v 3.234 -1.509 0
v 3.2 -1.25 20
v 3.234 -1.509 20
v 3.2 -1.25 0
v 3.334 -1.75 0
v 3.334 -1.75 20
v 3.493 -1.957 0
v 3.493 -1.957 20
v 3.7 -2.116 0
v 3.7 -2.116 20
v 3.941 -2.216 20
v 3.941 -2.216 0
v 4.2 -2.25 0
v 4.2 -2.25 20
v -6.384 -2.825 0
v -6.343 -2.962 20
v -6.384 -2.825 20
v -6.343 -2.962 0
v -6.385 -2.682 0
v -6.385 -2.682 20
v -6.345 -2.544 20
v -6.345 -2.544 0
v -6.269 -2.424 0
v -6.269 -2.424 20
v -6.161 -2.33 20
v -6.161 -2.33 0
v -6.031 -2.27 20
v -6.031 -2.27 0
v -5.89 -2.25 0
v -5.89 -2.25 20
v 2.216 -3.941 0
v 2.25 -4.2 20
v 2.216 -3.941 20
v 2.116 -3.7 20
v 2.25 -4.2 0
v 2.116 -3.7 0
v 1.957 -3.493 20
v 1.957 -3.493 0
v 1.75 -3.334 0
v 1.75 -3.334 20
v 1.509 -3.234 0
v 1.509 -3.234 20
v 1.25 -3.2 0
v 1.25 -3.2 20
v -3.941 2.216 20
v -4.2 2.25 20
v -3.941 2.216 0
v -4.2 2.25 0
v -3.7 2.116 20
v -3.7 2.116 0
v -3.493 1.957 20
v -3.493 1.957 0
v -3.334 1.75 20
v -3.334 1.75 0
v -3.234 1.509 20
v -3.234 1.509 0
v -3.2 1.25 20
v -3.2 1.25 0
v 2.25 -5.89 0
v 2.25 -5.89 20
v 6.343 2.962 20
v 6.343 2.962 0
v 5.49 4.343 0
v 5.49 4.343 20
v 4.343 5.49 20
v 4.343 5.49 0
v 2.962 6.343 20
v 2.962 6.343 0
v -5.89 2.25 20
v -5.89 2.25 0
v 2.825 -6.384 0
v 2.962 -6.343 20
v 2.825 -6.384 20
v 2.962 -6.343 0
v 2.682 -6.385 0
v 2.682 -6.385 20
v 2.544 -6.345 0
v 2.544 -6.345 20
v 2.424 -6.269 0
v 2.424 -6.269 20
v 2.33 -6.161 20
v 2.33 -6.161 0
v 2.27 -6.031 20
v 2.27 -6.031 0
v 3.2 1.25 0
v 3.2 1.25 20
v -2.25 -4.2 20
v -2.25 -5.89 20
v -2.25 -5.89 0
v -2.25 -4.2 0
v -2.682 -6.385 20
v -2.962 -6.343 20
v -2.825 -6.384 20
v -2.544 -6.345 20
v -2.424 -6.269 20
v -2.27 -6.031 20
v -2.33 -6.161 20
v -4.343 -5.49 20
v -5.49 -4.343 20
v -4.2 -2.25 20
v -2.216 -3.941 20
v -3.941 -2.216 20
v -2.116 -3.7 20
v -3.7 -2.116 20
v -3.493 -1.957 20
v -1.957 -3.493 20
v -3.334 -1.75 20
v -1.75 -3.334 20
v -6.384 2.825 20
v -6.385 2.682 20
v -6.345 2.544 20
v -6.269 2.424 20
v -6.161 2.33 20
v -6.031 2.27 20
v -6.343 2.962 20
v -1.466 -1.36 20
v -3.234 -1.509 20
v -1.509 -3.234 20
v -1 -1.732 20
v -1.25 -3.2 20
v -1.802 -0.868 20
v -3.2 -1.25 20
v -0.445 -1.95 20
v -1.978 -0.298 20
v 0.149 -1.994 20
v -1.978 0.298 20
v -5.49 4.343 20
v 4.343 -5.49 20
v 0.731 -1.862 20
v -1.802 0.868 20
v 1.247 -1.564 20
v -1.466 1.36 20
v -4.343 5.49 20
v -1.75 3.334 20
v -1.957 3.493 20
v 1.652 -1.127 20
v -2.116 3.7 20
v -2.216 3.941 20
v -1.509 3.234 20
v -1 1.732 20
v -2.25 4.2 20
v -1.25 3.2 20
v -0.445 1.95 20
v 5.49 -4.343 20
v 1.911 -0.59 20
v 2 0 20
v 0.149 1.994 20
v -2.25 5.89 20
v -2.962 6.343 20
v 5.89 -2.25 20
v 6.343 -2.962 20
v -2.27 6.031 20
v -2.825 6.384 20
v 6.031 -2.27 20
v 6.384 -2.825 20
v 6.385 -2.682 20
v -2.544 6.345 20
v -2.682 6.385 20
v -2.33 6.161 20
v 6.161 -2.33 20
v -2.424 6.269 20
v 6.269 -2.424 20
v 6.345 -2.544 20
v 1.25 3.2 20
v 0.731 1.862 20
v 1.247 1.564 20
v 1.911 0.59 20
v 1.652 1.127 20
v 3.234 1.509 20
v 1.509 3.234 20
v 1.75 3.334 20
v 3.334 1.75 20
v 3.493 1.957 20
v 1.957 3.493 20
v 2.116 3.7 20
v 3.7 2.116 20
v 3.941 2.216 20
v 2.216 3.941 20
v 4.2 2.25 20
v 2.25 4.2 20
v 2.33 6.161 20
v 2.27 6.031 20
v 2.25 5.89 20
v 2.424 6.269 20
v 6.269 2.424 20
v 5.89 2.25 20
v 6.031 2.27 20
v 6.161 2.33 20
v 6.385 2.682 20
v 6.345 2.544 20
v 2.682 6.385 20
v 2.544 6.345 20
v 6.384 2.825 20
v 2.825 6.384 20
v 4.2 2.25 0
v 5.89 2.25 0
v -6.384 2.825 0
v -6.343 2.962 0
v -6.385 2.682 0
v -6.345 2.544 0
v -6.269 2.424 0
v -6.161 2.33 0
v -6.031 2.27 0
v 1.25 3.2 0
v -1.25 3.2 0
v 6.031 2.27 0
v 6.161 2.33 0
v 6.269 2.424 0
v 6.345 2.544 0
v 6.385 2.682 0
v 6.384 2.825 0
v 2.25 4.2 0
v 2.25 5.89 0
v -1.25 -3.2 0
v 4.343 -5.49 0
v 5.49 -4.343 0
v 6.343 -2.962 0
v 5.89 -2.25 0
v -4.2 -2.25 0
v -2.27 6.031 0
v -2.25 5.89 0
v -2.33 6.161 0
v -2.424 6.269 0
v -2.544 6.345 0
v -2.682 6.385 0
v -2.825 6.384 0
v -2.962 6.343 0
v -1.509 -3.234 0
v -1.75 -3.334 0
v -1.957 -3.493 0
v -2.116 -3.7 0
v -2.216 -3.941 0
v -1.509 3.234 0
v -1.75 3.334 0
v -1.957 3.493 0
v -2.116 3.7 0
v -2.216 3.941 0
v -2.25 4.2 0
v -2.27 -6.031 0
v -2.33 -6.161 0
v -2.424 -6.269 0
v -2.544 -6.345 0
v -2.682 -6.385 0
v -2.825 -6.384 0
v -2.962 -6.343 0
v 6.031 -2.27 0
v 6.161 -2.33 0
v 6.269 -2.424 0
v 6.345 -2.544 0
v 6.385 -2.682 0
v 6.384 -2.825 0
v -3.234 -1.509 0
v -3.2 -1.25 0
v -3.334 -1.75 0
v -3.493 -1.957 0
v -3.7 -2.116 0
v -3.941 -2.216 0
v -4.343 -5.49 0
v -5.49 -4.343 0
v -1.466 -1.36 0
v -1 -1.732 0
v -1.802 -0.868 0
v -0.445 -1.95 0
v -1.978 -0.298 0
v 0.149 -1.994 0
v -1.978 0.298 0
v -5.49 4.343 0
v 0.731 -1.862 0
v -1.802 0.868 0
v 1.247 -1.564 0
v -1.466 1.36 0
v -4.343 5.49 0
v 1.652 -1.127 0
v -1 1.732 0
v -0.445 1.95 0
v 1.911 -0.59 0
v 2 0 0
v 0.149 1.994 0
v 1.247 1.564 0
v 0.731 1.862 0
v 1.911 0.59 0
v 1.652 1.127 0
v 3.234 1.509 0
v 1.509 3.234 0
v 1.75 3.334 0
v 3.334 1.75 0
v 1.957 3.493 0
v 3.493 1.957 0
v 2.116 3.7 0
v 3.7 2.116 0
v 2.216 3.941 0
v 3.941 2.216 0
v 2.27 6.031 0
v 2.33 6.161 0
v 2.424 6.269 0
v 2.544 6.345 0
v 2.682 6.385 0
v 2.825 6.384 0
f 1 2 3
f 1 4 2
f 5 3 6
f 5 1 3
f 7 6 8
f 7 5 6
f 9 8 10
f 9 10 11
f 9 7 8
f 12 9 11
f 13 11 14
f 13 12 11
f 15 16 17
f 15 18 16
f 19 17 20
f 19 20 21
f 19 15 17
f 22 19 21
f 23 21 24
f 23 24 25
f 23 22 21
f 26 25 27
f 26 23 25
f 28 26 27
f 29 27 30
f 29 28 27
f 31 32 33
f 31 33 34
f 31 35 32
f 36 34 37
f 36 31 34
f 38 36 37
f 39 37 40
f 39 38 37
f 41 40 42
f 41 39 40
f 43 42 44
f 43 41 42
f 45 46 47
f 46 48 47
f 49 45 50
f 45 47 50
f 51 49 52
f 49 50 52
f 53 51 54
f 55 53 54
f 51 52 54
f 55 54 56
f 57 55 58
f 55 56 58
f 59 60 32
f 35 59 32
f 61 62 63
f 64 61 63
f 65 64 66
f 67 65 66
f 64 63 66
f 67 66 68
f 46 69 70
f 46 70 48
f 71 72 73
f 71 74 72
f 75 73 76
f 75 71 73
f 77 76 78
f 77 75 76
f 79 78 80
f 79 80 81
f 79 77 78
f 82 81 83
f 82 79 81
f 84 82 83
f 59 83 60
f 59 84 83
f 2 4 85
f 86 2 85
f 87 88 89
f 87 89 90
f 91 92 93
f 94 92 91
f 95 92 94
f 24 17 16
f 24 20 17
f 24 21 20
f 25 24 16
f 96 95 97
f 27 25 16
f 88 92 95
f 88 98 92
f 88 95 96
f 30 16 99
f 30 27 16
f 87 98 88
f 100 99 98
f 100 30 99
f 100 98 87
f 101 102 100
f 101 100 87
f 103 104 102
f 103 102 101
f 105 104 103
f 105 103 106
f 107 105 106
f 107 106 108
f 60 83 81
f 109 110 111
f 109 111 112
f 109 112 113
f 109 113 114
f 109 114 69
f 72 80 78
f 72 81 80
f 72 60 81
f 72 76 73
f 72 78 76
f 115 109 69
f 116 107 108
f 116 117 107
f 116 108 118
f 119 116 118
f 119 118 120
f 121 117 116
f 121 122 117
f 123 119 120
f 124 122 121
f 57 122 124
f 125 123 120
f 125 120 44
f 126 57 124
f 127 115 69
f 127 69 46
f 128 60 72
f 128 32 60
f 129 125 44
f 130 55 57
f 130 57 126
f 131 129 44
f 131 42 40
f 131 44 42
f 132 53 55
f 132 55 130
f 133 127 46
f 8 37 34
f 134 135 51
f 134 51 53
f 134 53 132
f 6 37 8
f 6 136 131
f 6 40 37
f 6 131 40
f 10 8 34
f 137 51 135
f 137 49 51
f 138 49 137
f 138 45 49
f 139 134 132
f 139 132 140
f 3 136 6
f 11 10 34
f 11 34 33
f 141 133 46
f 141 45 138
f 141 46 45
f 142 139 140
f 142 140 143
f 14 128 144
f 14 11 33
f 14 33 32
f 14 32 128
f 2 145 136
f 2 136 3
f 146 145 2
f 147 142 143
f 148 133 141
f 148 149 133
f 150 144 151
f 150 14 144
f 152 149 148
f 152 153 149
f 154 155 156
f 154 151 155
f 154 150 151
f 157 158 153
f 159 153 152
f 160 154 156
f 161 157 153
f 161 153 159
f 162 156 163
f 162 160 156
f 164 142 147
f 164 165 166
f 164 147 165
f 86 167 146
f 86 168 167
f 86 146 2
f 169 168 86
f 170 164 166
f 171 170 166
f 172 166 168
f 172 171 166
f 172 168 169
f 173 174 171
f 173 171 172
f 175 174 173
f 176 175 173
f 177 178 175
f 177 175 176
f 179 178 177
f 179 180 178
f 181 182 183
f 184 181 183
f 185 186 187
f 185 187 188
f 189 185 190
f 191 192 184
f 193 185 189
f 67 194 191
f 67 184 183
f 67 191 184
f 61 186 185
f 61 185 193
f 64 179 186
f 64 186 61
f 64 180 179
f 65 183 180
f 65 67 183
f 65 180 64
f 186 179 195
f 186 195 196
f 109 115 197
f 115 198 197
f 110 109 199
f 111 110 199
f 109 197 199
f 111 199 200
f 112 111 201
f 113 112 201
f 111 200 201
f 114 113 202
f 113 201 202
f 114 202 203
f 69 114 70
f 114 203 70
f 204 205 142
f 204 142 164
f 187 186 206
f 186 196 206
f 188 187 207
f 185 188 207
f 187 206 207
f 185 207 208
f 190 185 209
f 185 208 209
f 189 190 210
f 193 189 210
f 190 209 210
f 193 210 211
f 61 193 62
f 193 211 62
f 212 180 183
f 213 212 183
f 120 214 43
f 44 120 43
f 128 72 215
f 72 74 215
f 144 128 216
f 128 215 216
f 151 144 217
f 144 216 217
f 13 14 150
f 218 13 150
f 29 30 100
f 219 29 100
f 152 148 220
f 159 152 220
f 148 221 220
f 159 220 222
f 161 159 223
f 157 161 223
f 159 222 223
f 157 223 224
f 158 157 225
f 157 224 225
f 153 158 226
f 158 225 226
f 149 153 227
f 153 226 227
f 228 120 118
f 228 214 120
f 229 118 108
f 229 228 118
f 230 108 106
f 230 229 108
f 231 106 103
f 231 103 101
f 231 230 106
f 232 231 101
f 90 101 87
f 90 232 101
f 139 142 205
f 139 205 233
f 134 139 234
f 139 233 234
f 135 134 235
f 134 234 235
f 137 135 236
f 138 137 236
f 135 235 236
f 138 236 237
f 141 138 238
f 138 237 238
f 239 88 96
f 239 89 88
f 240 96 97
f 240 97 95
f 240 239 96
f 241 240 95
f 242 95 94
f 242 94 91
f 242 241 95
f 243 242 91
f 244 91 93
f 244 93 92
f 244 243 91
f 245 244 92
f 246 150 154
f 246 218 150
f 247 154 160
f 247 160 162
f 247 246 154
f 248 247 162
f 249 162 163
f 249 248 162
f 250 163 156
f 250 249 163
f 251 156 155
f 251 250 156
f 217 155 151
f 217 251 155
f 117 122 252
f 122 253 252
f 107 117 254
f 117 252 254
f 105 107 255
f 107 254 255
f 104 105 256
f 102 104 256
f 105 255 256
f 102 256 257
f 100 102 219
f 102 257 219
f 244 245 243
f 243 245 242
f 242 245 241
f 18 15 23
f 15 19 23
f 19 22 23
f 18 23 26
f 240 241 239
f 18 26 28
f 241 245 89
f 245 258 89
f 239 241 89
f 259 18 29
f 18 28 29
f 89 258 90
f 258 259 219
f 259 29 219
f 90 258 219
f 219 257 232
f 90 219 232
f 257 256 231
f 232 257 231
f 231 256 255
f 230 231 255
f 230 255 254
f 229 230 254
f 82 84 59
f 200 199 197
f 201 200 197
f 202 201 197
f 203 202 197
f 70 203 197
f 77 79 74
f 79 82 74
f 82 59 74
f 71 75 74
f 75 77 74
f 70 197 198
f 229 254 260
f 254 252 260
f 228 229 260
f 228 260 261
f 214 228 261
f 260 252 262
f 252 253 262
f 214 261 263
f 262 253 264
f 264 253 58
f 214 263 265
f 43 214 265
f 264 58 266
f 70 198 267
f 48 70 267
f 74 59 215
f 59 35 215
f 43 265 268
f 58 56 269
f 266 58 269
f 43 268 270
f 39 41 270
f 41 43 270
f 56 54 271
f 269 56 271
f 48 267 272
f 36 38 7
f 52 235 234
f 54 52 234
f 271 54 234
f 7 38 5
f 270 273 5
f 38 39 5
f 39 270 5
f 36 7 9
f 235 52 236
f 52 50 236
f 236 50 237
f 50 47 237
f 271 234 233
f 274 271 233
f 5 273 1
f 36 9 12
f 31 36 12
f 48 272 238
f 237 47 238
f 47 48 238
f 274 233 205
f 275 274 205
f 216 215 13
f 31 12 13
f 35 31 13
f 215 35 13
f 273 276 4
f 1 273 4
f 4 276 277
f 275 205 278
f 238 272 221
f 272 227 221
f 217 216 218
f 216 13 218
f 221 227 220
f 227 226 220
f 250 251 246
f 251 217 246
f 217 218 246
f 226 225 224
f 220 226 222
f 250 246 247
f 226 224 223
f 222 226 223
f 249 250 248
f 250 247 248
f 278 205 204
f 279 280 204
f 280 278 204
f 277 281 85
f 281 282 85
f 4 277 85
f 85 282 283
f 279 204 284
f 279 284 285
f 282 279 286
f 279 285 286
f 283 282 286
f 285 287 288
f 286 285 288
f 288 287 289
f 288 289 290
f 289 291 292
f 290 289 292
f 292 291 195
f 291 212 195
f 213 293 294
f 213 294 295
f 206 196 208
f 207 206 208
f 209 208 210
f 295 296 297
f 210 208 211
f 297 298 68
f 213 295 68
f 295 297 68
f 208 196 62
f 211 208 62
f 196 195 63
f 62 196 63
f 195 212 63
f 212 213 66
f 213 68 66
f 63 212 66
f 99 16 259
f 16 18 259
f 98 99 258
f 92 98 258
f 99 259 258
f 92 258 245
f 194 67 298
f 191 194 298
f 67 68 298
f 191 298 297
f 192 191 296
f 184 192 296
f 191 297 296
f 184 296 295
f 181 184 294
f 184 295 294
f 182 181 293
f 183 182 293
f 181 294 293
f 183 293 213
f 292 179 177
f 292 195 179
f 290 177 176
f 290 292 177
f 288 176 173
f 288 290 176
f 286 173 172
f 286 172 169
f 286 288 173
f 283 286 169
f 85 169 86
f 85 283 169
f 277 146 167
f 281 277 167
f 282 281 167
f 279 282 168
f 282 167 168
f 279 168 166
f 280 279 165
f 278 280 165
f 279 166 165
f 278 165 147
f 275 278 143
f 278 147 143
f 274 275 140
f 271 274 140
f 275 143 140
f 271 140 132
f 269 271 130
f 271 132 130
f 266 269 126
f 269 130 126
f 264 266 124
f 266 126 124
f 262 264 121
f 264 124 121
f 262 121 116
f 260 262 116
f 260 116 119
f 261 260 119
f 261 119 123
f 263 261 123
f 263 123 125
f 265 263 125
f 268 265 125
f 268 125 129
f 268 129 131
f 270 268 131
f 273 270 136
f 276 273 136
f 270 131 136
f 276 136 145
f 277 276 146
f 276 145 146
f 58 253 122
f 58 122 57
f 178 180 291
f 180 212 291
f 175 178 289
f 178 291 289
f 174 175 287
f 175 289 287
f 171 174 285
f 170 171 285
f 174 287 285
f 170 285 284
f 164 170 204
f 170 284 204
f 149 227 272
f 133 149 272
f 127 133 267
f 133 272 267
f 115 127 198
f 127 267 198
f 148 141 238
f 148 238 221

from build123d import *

# Parameters (mm, degrees)
SKETCH_2_R          = 7
EXTRUDE_1_DEPTH     = 20
SKETCH_4_W          = 4.5
SKETCH_4_H          = 3.8
SKETCH_4_W_2        = 3.8
SKETCH_4_H_2        = 4.5
CUT_EXTRUDE_1_DEPTH = 20
SKETCH_5_R          = 2
CUT_EXTRUDE_2_DEPTH = 20
FILLET_1_R          = 1
FILLET_2_R          = 0.5


with BuildPart() as part:
    # 草图2 → 凸台-拉伸1 (new body)
    with BuildSketch(Plane.XY):
        Circle(SKETCH_2_R)
    extrude(amount=EXTRUDE_1_DEPTH)

    # 草图4 → 切除-拉伸1 (cut)
    with BuildSketch(Plane.XY.offset(20)):
        with Locations((0, 5.1)):
            Rectangle(SKETCH_4_W, SKETCH_4_H)
        with Locations((5.1, 0)):
            Rectangle(SKETCH_4_W_2, SKETCH_4_H_2)
        with Locations((0, -5.1)):
            Rectangle(SKETCH_4_W, SKETCH_4_H)
        with Locations((-5.1, 0)):
            Rectangle(SKETCH_4_W_2, SKETCH_4_H_2)
    extrude(amount=-CUT_EXTRUDE_1_DEPTH, mode=Mode.SUBTRACT)

    # 草图5 → 切除-拉伸2 (cut)
    with BuildSketch(Plane.XY.offset(20)):
        Circle(SKETCH_5_R)
    extrude(amount=-CUT_EXTRUDE_2_DEPTH, mode=Mode.SUBTRACT)

    # 圆角1
    fillet_1_edges = [part.edges().sort_by_distance(p)[0] for p in [
        (-2.25, 3.2, 10),
        (2.25, 3.2, 10),
        (3.2, 2.25, 10),
        (3.2, -2.25, 10),
        (2.25, -3.2, 10),
        (-2.25, -3.2, 10),
        (-3.2, -2.25, 10),
        (-3.2, 2.25, 10),
    ]]
    fillet(fillet_1_edges, radius=FILLET_1_R)

    # 圆角2
    fillet_2_edges = [part.edges().sort_by_distance(p)[0] for p in [
        (-2.25, 6.628536792, 10),
        (2.25, 6.628536792, 10),
        (6.628536792, -2.25, 10),
        (6.628536792, 2.25, 10),
        (2.25, -6.628536792, 10),
        (-2.25, -6.628536792, 10),
        (-6.628536792, 2.25, 10),
        (-6.628536792, -2.25, 10),
    ]]
    fillet(fillet_2_edges, radius=FILLET_2_R)


solid = part.part
